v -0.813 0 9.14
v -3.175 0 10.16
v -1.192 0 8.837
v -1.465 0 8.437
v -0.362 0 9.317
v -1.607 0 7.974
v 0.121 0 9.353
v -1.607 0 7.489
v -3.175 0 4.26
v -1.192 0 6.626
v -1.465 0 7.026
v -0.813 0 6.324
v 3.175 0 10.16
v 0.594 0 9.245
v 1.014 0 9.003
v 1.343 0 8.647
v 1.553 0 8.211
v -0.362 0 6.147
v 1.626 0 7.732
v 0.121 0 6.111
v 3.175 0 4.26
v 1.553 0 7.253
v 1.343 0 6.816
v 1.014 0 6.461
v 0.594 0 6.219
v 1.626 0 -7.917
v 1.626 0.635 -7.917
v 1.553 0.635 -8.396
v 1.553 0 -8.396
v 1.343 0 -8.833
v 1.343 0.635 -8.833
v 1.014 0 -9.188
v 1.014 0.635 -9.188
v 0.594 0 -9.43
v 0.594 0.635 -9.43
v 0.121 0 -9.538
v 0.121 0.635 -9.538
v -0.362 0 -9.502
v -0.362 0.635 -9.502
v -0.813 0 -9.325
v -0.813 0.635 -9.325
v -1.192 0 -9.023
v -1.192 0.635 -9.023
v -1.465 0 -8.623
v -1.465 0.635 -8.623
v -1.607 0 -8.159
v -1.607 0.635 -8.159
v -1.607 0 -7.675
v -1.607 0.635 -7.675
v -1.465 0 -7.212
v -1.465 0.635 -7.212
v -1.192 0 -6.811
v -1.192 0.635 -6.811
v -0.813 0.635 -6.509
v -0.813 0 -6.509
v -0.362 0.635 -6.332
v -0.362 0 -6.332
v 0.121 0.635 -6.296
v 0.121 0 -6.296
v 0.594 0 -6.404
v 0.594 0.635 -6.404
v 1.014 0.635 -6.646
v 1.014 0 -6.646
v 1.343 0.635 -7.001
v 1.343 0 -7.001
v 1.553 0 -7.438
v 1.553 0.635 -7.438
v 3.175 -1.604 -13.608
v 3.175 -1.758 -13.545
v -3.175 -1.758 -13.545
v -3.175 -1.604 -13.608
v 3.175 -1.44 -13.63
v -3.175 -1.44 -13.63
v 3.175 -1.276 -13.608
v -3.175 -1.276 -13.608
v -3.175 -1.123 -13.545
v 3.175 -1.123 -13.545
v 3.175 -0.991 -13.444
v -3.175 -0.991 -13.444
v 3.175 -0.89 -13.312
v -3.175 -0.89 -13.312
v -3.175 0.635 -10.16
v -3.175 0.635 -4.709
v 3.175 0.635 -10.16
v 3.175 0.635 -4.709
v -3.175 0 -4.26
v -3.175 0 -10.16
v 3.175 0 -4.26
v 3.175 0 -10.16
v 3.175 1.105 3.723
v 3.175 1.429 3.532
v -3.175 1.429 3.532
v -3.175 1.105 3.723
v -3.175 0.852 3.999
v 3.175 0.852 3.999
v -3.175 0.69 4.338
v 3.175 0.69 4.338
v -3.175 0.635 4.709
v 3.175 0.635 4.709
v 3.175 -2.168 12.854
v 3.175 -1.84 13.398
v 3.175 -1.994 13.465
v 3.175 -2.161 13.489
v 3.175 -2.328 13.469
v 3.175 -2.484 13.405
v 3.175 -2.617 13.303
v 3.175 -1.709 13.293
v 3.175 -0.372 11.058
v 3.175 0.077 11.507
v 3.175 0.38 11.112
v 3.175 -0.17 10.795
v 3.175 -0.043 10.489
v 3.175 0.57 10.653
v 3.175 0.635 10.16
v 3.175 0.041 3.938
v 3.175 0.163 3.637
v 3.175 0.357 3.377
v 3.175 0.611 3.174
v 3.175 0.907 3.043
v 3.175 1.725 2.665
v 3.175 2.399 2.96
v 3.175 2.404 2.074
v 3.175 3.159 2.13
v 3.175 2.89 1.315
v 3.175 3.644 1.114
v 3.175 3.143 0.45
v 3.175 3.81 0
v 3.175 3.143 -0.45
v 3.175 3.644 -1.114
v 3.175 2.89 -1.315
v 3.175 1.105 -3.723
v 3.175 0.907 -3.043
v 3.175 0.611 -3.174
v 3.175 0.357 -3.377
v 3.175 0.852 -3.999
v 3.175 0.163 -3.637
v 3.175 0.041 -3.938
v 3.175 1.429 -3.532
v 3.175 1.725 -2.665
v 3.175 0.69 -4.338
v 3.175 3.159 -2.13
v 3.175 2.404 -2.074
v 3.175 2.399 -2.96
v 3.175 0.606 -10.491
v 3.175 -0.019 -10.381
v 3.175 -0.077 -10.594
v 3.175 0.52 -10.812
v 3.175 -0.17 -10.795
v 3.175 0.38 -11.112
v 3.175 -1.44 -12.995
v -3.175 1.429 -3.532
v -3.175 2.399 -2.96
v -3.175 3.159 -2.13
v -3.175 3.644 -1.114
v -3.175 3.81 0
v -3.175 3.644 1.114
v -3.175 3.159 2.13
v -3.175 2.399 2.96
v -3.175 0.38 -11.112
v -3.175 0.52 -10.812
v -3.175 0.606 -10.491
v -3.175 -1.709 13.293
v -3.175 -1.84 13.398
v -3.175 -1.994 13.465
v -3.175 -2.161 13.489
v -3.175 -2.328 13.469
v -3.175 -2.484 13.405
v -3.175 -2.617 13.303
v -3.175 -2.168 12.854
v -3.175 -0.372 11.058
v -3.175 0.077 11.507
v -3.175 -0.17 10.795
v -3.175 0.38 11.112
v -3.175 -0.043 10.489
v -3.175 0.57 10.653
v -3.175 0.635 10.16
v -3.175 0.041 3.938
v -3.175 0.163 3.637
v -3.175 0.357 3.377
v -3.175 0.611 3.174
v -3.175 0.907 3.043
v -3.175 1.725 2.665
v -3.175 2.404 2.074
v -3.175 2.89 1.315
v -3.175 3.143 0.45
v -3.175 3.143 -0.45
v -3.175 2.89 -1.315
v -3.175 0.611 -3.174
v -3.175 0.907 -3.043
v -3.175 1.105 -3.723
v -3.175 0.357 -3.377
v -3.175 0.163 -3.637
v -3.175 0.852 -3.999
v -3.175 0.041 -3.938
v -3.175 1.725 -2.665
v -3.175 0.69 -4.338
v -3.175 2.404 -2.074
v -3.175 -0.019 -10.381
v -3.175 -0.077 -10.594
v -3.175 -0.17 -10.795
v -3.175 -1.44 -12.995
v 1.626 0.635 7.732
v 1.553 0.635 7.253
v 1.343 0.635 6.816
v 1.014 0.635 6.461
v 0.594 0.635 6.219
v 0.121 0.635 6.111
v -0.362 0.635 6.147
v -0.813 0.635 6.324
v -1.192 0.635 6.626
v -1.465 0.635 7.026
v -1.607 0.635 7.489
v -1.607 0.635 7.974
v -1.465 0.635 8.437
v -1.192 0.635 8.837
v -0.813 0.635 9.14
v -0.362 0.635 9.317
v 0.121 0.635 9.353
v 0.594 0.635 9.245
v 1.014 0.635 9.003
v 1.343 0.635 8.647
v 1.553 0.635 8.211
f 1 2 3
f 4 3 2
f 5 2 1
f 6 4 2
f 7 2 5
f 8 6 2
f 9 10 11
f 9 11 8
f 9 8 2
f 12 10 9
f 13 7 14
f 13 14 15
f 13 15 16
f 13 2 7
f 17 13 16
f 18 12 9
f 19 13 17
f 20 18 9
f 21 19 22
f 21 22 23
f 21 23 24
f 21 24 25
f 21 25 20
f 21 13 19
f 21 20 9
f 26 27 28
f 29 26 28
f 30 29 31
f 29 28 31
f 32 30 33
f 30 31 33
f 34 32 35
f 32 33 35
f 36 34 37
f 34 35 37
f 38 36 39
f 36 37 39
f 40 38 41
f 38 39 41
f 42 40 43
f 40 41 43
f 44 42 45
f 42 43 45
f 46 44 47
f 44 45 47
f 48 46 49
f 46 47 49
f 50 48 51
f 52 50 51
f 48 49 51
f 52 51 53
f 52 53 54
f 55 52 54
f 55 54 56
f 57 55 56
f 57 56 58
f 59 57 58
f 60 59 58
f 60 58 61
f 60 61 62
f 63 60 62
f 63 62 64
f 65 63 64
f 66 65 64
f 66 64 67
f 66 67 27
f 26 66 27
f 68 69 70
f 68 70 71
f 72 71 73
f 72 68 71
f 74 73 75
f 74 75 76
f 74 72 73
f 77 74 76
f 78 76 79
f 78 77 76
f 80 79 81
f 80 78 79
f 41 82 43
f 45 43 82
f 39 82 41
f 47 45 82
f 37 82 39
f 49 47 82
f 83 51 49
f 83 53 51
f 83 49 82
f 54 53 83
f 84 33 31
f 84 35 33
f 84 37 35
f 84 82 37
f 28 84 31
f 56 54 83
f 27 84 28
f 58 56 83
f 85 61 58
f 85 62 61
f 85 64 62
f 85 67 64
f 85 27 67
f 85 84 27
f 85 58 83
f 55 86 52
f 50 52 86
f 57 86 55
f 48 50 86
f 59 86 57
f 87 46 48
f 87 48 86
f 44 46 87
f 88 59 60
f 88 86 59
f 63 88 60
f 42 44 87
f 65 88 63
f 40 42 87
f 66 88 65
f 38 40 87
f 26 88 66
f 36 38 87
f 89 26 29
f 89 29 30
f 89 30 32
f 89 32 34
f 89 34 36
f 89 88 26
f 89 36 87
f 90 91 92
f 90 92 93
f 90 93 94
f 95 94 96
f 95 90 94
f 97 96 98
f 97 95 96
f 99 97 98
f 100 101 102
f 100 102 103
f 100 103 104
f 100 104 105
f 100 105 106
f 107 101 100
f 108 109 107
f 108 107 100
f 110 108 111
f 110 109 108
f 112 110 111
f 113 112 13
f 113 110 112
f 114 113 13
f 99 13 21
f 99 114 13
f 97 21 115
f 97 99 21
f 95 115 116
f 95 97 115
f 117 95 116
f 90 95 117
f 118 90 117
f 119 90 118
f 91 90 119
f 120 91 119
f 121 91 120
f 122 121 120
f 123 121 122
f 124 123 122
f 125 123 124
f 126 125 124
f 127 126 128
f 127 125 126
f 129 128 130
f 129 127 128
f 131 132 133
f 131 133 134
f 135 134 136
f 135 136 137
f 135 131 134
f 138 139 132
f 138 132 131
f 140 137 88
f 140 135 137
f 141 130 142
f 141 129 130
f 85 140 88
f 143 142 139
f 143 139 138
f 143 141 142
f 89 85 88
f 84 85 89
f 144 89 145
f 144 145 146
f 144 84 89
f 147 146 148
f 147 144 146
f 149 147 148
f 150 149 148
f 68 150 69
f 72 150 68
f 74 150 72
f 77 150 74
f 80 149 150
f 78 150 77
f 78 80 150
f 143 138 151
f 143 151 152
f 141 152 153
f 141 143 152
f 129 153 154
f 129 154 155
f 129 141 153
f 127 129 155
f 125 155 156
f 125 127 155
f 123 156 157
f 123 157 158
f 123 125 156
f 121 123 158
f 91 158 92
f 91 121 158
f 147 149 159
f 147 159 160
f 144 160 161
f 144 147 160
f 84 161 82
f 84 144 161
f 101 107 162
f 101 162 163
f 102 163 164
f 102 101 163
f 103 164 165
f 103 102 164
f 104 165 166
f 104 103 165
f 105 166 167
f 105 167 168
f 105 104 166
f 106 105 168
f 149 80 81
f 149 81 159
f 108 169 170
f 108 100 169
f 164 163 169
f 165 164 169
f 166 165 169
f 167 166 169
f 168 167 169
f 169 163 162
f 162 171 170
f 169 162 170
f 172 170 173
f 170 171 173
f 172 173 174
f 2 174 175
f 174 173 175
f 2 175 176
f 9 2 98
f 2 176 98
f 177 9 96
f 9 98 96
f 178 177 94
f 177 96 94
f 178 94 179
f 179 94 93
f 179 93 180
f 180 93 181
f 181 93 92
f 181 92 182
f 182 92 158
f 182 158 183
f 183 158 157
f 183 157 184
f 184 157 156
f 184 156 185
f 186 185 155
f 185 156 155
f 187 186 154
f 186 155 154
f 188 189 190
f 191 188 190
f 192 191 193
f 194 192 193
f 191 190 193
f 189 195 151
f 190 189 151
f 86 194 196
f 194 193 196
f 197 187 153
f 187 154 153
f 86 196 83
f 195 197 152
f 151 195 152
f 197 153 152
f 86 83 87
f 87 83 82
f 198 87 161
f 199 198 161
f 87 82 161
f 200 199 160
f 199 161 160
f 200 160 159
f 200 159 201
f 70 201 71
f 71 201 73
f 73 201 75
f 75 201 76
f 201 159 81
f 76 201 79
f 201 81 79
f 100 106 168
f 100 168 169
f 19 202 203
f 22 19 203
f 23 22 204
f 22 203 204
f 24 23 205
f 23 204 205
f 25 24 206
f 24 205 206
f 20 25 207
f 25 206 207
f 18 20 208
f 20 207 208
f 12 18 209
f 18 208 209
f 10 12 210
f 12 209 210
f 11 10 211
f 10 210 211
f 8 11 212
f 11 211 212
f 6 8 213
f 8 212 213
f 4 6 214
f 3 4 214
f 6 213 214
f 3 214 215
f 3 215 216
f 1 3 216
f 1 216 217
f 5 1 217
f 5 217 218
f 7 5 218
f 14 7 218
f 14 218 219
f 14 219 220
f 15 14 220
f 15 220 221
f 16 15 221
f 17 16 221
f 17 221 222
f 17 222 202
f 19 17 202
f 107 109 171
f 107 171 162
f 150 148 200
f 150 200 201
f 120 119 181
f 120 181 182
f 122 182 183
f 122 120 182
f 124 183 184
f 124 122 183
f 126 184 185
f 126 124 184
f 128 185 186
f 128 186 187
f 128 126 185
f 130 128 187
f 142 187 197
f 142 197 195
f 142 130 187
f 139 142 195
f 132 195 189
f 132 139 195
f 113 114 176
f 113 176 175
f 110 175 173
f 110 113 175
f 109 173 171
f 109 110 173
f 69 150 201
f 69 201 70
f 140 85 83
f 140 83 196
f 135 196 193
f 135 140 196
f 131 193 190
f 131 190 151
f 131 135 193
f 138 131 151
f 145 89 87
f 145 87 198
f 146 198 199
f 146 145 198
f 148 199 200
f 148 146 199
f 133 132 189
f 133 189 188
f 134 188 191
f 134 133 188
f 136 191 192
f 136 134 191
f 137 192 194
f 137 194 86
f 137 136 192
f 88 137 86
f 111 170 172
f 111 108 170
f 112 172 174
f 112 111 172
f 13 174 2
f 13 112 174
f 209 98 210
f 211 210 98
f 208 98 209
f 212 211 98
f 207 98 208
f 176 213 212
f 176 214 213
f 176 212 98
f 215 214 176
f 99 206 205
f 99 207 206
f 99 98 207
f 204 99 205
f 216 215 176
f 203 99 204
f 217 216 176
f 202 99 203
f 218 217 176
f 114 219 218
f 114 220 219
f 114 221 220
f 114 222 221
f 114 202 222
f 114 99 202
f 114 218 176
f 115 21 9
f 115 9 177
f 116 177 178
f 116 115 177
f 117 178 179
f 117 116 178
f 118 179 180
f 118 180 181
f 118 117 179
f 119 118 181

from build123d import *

# Parameters (mm, degrees)
BOSS_EXTRUDE1_DEPTH            = 3.175
CUT_EXTRUDE1_REACH             = 5.252
SKETCH2_R                      = 1.6256
CUT_EXTRUDE1_DIRECTION_2_DEPTH = 4.175


with BuildPart() as part:
    # Sketch1 → Boss-Extrude1 (new body, symmetric)
    with BuildSketch(Plane(origin=(0, 0, 0), x_dir=(0, 0, -1), z_dir=(1, 0, 0))):
        with BuildLine():
            Line((-10.16, 0), (-4.259709497, 0))
            ThreePointArc((-4.259709497, 0), (-3.50073933, 0.251734668), (-3.042649641, 0.907142857))
            ThreePointArc((-3.042649641, 0.907142857), (0, 3.175), (3.042649641, 0.907142857))
            ThreePointArc((3.042649641, 0.907142857), (3.50073933, 0.251734668), (4.259709497, 0))
            Line((4.259709497, 0), (10.16, 0))
            ThreePointArc((10.16, 0), (10.488700187, -0.043274201), (10.795, -0.170147737))
            Line((10.795, -0.170147737), (12.994704526, -1.440147737))
            Line((12.994704526, -1.440147737), (13.544630657, -1.757647737))
            ThreePointArc((13.544630657, -1.757647737), (13.608067425, -1.275797644), (13.312204526, -0.890221606))
            Line((13.312204526, -0.890221606), (11.1125, 0.379778394))
            ThreePointArc((11.1125, 0.379778394), (10.653050281, 0.570088699), (10.16, 0.635))
            Line((10.16, 0.635), (4.709286039, 0.635))
            ThreePointArc((4.709286039, 0.635), (3.999334456, 0.851971629), (3.531964529, 1.42875))
            ThreePointArc((3.531964529, 1.42875), (0, 3.81), (-3.531964529, 1.42875))
            ThreePointArc((-3.531964529, 1.42875), (-3.999334456, 0.851971629), (-4.709286039, 0.635))
            Line((-4.709286039, 0.635), (-10.16, 0.635))
            ThreePointArc((-10.16, 0.635), (-10.889011939, 0.489990509), (-11.507038418, 0.077038418))
            Line((-11.507038418, 0.077038418), (-13.292936294, -1.708859457))
            ThreePointArc((-13.292936294, -1.708859457), (-13.48919858, -2.160845652), (-13.303204425, -2.6171532))
            Line((-13.303204425, -2.6171532), (-12.854076836, -2.168025612))
            Line((-12.854076836, -2.168025612), (-11.058025612, -0.371974388))
            ThreePointArc((-11.058025612, -0.371974388), (-10.646007959, -0.096672994), (-10.16, 0))
        make_face()
    extrude(amount=BOSS_EXTRUDE1_DEPTH, both=True)

    # Sketch2 → Cut-Extrude1 (cut, up to next)
    with BuildSketch(Plane(origin=(0, 0.635, 0), x_dir=(1, 0, 0), z_dir=(0, 1, 0)), mode=Mode.PRIVATE) as cut_extrude1_sk1:
        with Locations((0, -7.73176)):
            Circle(SKETCH2_R)
    cut_extrude1_tool1 = extrude(cut_extrude1_sk1.sketch, amount=-CUT_EXTRUDE1_REACH, mode=Mode.PRIVATE) & part.part
    add(cut_extrude1_tool1.solids().sort_by_distance((0, 0.635, 7.73176))[0], mode=Mode.SUBTRACT)
    # Sketch2 → Cut-Extrude1 (cut, up to next)
    with BuildSketch(Plane(origin=(0, 0.635, 0), x_dir=(1, 0, 0), z_dir=(0, 1, 0)), mode=Mode.PRIVATE) as cut_extrude1_sk2:
        with Locations((0, 7.91718)):
            Circle(SKETCH2_R)
    cut_extrude1_tool2 = extrude(cut_extrude1_sk2.sketch, amount=-CUT_EXTRUDE1_REACH, mode=Mode.PRIVATE) & part.part
    add(cut_extrude1_tool2.solids().sort_by_distance((0, 0.635, -7.91718))[0], mode=Mode.SUBTRACT)

    # Sketch2 → Cut-Extrude1 direction 2 (cut)
    with BuildSketch(Plane(origin=(0, 0.635, 0), x_dir=(1, 0, 0), z_dir=(0, 1, 0))):
        with Locations((0, -7.73176)):
            Circle(SKETCH2_R)
        with Locations((0, 7.91718)):
            Circle(SKETCH2_R)
    extrude(amount=CUT_EXTRUDE1_DIRECTION_2_DEPTH, mode=Mode.SUBTRACT)


solid = part.part
